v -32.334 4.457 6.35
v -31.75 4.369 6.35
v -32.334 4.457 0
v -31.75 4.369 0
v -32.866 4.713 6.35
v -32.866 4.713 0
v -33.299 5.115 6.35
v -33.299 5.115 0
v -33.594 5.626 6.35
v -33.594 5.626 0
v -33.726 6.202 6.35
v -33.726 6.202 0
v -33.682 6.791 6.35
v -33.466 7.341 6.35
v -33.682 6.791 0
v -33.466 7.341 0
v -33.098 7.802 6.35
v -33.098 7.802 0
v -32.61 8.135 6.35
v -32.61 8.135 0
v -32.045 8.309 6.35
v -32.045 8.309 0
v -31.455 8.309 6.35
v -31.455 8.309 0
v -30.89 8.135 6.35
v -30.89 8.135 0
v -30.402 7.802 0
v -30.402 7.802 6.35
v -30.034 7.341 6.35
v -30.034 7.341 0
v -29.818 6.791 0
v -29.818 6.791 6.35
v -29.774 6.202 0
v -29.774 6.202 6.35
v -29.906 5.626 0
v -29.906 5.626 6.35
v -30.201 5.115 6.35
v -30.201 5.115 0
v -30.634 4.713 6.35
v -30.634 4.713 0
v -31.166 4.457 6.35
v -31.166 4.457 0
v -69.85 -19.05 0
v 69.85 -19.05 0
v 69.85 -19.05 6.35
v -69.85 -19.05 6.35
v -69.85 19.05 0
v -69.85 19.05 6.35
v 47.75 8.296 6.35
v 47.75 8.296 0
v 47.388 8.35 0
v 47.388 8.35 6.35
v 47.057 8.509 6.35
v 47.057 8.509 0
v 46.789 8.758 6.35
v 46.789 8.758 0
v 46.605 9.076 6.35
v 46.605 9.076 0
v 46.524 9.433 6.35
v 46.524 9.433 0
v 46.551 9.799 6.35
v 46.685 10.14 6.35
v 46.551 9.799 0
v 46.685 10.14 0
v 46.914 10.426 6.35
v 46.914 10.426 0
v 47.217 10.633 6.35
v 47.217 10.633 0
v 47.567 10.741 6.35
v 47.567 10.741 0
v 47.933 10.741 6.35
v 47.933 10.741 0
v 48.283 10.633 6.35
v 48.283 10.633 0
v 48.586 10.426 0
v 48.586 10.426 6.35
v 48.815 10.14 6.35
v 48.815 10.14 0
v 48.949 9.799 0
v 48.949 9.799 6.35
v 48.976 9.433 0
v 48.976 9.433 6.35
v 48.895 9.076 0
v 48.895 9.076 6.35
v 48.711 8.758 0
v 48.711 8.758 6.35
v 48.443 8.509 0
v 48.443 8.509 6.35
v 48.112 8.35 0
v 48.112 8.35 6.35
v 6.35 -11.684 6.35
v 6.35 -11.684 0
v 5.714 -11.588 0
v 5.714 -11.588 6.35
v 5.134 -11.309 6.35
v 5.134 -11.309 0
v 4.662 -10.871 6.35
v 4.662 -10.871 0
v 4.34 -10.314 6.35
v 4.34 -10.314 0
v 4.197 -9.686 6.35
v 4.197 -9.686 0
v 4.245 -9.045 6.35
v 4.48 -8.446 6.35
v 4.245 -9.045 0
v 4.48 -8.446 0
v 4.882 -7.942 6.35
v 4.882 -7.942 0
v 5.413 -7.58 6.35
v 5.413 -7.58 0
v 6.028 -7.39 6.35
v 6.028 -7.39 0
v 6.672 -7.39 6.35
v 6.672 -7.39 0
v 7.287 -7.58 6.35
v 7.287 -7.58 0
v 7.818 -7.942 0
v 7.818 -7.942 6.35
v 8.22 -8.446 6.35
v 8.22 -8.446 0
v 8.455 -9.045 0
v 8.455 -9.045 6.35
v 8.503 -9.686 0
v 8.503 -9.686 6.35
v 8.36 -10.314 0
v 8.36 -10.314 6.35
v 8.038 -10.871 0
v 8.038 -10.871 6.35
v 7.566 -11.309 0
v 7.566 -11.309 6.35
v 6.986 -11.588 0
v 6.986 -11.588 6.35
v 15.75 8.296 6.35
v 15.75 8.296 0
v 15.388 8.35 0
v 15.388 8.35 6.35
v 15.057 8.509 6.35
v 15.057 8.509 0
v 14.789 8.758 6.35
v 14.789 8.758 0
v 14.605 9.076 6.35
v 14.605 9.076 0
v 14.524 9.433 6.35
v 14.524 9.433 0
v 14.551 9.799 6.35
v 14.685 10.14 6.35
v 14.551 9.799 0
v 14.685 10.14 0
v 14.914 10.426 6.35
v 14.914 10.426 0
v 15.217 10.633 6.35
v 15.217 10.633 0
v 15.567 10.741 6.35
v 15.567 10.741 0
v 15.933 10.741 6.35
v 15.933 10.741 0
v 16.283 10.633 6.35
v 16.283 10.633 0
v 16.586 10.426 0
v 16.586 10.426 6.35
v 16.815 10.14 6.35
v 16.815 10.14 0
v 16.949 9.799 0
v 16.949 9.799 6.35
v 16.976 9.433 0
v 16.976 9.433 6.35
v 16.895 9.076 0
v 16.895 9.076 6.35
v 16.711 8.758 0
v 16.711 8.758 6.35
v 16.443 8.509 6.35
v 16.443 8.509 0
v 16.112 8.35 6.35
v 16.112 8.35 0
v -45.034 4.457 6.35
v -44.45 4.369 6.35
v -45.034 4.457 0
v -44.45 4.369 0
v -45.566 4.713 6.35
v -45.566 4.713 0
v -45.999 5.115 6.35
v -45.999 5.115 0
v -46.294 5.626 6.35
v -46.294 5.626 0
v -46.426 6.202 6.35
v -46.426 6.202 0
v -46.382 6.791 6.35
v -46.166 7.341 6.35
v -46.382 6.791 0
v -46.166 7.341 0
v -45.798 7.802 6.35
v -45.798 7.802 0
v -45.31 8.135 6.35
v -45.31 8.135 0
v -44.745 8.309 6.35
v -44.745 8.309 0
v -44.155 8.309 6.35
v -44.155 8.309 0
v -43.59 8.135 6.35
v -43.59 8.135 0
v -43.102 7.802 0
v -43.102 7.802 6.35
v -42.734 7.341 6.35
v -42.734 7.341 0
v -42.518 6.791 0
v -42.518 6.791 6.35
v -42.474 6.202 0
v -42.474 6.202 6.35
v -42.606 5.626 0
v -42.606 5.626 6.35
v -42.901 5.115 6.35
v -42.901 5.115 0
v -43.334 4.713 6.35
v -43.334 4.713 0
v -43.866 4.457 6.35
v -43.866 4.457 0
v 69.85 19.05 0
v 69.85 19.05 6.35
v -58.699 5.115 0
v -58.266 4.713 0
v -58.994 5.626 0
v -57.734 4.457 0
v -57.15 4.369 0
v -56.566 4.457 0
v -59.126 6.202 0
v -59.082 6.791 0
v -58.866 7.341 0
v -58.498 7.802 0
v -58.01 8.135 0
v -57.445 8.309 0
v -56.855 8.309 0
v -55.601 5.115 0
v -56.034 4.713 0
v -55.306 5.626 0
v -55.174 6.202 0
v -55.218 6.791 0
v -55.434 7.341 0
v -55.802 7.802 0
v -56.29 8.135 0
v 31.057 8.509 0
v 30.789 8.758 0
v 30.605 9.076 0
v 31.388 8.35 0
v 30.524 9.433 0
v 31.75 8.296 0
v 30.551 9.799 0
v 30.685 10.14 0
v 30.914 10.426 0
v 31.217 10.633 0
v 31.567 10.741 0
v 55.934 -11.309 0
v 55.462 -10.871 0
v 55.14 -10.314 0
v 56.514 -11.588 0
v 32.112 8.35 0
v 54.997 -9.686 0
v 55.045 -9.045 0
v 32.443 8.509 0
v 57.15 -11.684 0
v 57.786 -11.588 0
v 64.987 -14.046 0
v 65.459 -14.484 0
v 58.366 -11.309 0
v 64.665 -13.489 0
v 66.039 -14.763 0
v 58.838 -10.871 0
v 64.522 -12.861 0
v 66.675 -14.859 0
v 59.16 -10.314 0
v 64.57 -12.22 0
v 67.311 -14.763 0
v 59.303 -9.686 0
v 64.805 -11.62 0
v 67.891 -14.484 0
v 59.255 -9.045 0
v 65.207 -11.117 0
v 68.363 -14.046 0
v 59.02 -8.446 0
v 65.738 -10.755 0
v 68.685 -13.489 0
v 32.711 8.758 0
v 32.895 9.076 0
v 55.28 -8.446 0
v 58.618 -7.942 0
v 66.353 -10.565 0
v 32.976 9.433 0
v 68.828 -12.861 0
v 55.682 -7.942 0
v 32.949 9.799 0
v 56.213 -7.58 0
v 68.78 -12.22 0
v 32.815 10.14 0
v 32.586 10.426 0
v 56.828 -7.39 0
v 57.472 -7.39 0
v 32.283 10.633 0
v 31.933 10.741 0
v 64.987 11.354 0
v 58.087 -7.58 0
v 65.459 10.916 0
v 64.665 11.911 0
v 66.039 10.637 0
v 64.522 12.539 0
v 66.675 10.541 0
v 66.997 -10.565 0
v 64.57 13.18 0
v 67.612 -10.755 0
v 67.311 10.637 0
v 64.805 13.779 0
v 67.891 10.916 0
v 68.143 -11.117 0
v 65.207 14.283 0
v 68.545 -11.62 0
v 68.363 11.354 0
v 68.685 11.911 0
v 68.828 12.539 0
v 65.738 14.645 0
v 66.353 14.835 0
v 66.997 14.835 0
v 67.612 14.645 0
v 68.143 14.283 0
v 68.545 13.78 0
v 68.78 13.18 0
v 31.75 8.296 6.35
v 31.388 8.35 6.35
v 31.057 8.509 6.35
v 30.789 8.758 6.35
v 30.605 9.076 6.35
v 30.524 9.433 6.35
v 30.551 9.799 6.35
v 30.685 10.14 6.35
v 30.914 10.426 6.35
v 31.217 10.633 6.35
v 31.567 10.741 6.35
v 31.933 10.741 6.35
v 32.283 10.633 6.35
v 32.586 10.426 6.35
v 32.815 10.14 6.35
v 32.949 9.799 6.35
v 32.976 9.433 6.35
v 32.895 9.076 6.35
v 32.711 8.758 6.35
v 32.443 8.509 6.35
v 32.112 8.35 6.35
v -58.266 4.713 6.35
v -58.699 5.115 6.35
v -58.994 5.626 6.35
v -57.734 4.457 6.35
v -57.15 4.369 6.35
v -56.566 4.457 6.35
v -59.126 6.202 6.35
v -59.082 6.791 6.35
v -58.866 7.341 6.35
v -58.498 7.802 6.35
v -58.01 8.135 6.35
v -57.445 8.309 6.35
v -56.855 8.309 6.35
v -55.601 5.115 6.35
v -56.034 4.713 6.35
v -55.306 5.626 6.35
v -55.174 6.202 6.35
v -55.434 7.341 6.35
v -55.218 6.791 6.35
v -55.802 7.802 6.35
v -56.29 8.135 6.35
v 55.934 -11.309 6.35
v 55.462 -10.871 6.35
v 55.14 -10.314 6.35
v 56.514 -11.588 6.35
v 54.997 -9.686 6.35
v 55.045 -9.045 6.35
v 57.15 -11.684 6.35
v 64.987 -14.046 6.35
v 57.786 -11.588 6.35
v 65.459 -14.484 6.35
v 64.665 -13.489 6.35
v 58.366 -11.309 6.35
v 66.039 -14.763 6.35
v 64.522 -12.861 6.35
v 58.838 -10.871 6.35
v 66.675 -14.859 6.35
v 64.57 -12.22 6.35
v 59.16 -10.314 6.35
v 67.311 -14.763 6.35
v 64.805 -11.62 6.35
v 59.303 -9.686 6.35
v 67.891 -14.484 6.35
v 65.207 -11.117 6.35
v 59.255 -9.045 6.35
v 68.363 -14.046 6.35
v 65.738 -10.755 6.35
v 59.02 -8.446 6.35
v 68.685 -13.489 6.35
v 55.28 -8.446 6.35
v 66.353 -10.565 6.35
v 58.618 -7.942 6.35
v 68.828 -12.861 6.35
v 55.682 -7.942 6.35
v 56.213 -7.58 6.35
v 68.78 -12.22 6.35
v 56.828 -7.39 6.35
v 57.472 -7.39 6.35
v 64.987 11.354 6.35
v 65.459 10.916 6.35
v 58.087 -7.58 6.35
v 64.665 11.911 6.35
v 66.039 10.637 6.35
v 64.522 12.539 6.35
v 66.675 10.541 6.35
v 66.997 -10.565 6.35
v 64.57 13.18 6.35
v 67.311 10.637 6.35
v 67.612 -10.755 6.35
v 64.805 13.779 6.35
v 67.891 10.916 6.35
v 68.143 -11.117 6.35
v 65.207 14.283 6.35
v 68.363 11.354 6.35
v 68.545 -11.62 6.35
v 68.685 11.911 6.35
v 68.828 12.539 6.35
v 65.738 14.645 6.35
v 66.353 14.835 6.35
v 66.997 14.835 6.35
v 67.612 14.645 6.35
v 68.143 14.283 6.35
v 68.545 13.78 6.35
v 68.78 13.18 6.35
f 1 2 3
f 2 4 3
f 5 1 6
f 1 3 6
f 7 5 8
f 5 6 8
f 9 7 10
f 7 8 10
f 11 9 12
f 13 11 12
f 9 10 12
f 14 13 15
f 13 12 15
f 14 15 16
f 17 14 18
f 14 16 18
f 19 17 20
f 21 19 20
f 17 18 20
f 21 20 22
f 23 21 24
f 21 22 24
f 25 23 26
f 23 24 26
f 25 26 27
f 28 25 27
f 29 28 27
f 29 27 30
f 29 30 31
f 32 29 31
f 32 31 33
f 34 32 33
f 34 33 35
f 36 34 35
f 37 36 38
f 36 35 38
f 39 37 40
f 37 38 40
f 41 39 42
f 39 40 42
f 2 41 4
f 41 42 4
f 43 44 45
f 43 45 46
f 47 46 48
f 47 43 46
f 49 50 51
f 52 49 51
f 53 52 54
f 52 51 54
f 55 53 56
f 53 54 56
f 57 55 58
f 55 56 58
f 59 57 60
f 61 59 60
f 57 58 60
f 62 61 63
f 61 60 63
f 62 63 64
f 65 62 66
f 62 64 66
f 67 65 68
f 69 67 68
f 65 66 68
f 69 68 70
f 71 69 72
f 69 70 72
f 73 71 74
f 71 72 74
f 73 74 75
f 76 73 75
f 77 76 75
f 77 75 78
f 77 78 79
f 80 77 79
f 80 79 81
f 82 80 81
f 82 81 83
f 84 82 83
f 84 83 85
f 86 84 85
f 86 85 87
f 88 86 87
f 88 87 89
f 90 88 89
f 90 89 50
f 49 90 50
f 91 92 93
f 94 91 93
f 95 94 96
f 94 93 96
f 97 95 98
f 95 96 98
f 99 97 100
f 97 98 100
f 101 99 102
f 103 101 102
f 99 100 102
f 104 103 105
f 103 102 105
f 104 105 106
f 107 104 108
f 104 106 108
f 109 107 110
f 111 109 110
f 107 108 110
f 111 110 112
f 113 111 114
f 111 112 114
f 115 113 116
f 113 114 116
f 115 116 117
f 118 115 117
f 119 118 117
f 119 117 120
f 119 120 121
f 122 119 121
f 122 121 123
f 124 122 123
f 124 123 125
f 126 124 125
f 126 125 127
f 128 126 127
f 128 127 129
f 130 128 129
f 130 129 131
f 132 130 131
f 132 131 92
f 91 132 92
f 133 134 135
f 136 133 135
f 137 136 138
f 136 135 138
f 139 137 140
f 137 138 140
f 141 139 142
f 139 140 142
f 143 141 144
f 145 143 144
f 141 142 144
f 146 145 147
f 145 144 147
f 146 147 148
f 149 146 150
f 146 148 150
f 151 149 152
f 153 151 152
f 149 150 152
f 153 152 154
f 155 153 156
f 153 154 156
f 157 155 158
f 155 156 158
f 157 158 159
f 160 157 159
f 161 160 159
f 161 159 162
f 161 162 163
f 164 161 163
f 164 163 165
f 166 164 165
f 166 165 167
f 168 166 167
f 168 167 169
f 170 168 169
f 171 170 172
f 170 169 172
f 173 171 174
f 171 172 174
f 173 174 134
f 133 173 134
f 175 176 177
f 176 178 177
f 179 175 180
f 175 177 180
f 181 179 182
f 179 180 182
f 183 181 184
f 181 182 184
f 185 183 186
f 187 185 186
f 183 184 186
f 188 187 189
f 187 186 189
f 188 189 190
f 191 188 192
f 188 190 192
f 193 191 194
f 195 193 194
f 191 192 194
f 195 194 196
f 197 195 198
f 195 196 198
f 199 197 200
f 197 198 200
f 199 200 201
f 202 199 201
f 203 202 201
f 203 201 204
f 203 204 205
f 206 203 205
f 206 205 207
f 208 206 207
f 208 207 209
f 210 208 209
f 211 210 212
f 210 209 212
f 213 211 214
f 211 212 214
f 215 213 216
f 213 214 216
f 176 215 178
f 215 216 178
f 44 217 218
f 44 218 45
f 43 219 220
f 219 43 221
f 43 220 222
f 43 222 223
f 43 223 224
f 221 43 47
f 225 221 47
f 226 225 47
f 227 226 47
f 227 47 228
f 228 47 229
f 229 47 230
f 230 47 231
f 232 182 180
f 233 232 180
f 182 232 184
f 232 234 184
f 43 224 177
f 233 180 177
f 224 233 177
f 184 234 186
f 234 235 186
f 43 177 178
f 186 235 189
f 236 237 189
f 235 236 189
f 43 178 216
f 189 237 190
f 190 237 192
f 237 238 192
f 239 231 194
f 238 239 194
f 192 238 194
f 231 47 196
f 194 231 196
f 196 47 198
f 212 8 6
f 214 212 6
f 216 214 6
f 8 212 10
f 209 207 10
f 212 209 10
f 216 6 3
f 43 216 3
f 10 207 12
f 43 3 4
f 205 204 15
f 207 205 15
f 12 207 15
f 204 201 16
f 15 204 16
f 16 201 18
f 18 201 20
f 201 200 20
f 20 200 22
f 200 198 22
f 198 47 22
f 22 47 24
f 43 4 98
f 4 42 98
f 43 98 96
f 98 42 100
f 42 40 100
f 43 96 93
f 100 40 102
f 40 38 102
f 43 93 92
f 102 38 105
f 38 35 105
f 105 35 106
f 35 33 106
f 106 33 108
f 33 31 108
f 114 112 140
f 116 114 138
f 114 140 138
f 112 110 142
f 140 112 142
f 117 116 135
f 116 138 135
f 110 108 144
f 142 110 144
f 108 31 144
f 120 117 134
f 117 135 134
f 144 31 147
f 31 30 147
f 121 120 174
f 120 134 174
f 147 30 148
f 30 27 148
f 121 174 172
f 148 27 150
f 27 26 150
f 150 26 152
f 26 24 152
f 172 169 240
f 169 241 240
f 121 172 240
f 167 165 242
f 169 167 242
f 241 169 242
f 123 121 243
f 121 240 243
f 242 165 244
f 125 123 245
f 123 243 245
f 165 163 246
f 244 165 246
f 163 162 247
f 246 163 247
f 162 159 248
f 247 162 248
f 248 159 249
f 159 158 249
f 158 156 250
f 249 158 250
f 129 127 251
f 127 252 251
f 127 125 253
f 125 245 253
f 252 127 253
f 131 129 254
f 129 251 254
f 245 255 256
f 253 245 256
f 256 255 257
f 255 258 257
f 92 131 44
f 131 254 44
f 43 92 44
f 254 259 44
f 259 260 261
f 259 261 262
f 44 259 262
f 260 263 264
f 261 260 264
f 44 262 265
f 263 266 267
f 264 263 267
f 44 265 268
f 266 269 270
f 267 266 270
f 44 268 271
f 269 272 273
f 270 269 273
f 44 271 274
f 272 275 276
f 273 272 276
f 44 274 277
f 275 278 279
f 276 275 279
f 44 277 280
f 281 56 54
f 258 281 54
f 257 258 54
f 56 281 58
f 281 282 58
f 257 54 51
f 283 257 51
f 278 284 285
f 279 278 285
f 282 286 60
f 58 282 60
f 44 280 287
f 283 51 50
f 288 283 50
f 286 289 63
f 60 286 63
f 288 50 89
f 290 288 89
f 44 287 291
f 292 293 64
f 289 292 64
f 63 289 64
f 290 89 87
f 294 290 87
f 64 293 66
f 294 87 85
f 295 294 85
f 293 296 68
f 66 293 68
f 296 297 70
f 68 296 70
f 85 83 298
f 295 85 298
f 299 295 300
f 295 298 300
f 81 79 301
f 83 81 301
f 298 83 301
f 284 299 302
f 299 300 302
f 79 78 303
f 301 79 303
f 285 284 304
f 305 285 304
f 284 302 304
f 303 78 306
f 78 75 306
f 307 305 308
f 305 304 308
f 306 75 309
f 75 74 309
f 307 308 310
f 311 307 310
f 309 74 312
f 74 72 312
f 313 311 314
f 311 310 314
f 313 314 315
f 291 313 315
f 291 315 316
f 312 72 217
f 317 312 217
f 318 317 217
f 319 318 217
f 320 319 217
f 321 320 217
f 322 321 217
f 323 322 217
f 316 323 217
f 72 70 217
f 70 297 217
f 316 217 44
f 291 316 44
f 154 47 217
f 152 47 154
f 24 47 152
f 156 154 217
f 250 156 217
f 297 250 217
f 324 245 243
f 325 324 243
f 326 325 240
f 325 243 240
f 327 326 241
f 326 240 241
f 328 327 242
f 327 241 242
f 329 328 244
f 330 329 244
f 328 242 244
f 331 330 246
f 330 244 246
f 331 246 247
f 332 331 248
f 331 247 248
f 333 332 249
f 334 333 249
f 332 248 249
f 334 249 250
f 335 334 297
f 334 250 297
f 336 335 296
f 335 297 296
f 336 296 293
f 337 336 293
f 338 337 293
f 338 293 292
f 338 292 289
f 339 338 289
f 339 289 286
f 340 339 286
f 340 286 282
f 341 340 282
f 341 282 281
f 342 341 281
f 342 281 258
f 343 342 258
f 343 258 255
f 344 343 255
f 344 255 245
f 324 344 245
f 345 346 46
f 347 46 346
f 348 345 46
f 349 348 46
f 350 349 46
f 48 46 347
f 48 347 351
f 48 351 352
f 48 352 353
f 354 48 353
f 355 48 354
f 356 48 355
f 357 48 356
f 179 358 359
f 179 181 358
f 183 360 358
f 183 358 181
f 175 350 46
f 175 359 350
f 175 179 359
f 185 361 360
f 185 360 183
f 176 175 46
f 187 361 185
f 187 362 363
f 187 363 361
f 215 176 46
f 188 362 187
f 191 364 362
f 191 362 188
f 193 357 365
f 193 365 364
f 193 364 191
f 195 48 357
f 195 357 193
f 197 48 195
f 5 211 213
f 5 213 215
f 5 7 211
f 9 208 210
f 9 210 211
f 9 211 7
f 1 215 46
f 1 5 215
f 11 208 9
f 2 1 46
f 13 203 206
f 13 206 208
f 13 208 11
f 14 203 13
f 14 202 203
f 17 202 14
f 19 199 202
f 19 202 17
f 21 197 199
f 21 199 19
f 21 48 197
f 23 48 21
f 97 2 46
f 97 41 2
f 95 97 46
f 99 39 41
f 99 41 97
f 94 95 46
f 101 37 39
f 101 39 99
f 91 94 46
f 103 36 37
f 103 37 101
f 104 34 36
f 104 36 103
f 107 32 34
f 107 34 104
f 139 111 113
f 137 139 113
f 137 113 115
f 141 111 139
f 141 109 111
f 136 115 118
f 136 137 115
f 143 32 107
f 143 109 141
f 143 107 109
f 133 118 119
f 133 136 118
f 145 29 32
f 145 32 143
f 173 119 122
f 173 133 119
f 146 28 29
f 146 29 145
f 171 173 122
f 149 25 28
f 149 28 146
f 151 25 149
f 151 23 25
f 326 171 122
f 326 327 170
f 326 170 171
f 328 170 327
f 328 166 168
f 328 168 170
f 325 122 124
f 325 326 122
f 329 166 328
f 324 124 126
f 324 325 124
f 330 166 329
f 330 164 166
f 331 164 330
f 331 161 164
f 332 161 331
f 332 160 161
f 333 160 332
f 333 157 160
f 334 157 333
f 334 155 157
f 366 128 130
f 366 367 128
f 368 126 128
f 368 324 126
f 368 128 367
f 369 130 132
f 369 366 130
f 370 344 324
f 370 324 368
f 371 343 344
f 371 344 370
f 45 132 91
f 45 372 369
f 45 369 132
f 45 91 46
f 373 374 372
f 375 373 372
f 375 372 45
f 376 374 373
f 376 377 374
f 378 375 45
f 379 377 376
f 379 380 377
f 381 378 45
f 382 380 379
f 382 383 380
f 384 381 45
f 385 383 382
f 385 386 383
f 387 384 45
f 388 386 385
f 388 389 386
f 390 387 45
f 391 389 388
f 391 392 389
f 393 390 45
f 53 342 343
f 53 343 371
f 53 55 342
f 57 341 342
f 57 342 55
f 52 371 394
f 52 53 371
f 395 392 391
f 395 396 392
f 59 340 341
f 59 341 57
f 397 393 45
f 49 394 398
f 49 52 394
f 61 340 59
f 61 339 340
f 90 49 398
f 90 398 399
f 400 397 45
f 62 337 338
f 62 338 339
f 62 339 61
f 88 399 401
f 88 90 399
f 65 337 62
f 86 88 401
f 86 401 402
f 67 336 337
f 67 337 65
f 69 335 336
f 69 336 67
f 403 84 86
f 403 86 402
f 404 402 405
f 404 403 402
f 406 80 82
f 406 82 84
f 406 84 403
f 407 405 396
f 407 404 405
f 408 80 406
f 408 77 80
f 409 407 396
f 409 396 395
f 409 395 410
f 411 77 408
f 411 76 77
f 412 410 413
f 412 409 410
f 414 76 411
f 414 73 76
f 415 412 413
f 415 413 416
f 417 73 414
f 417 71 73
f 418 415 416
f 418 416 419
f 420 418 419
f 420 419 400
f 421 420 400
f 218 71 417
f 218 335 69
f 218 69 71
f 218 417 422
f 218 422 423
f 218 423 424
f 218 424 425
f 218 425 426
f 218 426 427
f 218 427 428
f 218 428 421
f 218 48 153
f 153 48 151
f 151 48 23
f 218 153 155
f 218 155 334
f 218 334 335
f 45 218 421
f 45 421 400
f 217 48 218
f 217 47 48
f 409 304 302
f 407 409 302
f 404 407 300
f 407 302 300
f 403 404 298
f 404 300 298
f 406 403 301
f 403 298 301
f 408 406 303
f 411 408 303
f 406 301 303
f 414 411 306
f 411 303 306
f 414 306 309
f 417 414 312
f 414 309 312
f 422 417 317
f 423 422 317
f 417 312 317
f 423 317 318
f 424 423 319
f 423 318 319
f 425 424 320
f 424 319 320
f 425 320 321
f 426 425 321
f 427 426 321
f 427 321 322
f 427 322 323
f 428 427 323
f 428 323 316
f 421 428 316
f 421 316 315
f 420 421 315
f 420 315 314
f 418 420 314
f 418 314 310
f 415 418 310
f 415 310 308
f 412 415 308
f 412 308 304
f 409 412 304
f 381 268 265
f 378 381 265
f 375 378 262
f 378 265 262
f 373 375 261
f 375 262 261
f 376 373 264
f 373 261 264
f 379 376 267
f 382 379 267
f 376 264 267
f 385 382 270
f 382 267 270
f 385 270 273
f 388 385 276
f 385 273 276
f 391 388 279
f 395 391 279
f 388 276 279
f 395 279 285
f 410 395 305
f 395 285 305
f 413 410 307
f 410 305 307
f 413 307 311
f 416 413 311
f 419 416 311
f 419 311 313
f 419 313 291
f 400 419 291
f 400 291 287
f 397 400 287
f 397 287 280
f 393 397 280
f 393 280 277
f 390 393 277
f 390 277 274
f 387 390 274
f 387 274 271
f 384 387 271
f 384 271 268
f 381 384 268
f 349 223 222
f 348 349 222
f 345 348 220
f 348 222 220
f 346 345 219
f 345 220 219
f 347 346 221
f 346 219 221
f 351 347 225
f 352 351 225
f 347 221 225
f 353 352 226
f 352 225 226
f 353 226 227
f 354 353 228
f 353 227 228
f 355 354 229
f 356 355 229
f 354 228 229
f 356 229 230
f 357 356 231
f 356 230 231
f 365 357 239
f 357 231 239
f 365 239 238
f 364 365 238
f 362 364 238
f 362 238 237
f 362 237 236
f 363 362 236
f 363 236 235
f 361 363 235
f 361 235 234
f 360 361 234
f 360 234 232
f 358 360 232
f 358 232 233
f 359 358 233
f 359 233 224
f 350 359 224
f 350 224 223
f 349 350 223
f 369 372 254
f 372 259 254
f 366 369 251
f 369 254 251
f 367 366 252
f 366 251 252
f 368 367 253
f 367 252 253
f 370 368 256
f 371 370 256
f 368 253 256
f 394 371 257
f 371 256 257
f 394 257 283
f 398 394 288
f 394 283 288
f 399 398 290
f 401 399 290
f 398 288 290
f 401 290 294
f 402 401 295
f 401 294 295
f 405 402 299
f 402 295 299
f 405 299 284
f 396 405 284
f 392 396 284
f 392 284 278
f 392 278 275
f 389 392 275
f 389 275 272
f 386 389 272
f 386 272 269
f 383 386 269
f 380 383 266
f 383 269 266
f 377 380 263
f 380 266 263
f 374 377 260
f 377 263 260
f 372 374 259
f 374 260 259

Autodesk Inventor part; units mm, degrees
ref_plane "YZ Plane" through (0, 0, 0) normal (1, 0, 0) x (0, 1, 0)
ref_plane "XZ Plane" through (0, 0, 0) normal (0, 1, 0) x (-1, 0, 0)
ref_plane "XY Plane" through (0, 0, 0) normal (0, 0, 1) x (1, 0, 0)
sketch "Sketch1" plane through (0, 0, 0) normal (0, 0, 1) x (1, 0, 0)
  line L0 (69.85, -19.05) -> (-69.85, -19.05)
  line L1 (-69.85, -19.05) -> (-69.85, 19.05)
  line L2 (-69.85, 19.05) -> (69.85, 19.05)
  line L3 (69.85, 19.05) -> (69.85, -19.05)
  line L4 (69.85, -19.05) -> (-69.85, 19.05) construction
  line L5 (-69.85, -19.05) -> (69.85, 19.05) construction
  point P0 (0, 0)
  dimension "d0" = 139.7
  dimension "d1" = 38.1
extrude "Extrusion1" add sketch "Sketch1" along normal blind 6.35
sketch "Sketch2" plane through (0, 0, 6.35) normal (0, 0, 1) x (1, 0, 0)
  line L0 (-69.85, 19.05) -> (-69.85, -19.05) projected
  line L1 (69.85, 19.05) -> (-69.85, 19.05) projected
  point P0 (0, 0)
  point P1 (-57.15, 6.35)
  point P2 (-44.45, 6.35)
  point P3 (-31.75, 6.35)
  point P4 (-69.85, 0)
  dimension "d5" = 12.7
  dimension "d6" = 12.7
  dimension "d14" = 12.7
  dimension "d15" = 12.7
hole "Hole1" at (-57.15, 6.35, 6.35) at (-44.45, 6.35, 6.35) at (-31.75, 6.35, 6.35) direction (0, 0, -1) diameter 3.9624 end through all thread size "10-32 UNF" class "2B" standard "ANSI Unified Screw Threads"
sketch "Sketch3" plane through (0, 0, 6.35) normal (0, 0, 1) x (1, 0, 0)
  line L0 (69.85, 19.05) -> (-69.85, 19.05) projected
  line L1 (-69.85, -19.05) -> (69.85, -19.05) projected
  line L2 (69.85, -19.05) -> (69.85, 19.05) projected
  line L3 (6.35, -9.525) -> (57.15, -9.525) construction
  line L4 (-69.85, 19.05) -> (-69.85, -19.05) construction
  point P0 (0, 0)
  point P1 (66.675, 12.7)
  point P2 (66.675, -12.7)
  point P3 (-69.85, 0)
  dimension "d16" = 6.35
  dimension "d17" = 6.35
  dimension "d18" = 3.175
  dimension "d39" = 50.8
  dimension "d41" = 28.575
  dimension "d43" = 12.7
hole "Hole2" at (66.675, 12.7, 6.35) at (66.675, -12.7, 6.35) at (6.35, -9.525, 6.35) at (57.15, -9.525, 6.35) direction (0, 0, -1) diameter 4.318 end through all clearance for "Flat Head Machine Screw (82)" size "#8" standard "Ansi Unified Screw Threads"
sketch "Sketch6" plane through (0, 0, 6.35) normal (0, 0, 1) x (1, 0, 0)
  line L0 (47.75, 9.525) -> (15.75, 9.525) construction
  line L1 (69.85, -19.05) -> (69.85, 19.05) construction
  line L2 (-69.85, -19.05) -> (69.85, -19.05) construction
  point P0 (0, 0)
  point P1 (69.85, 0)
  point P2 (69.85, 0)
  point P3 (31.75, 9.525)
  point P4 (31.75, 1.524)
  dimension "d30" = 32
  dimension "d45" = 28.575
  dimension "d46" = 38.1
  dimension "d47" = 8.001
hole "Hole3" at (47.75, 9.525, 6.35) at (15.75, 9.525, 6.35) at (31.75, 9.525, 6.35) direction (0, 0, -1) diameter 2.459 end through all thread size "M3x0.5" class "6H" standard "ANSI Metric M Profile"
equation "\"d5\" = d4"
equation "\"d6\" = d4"
equation "\"d4\" = 12.7"
properties part number "EL2-021" material "Aluminum 6061"
